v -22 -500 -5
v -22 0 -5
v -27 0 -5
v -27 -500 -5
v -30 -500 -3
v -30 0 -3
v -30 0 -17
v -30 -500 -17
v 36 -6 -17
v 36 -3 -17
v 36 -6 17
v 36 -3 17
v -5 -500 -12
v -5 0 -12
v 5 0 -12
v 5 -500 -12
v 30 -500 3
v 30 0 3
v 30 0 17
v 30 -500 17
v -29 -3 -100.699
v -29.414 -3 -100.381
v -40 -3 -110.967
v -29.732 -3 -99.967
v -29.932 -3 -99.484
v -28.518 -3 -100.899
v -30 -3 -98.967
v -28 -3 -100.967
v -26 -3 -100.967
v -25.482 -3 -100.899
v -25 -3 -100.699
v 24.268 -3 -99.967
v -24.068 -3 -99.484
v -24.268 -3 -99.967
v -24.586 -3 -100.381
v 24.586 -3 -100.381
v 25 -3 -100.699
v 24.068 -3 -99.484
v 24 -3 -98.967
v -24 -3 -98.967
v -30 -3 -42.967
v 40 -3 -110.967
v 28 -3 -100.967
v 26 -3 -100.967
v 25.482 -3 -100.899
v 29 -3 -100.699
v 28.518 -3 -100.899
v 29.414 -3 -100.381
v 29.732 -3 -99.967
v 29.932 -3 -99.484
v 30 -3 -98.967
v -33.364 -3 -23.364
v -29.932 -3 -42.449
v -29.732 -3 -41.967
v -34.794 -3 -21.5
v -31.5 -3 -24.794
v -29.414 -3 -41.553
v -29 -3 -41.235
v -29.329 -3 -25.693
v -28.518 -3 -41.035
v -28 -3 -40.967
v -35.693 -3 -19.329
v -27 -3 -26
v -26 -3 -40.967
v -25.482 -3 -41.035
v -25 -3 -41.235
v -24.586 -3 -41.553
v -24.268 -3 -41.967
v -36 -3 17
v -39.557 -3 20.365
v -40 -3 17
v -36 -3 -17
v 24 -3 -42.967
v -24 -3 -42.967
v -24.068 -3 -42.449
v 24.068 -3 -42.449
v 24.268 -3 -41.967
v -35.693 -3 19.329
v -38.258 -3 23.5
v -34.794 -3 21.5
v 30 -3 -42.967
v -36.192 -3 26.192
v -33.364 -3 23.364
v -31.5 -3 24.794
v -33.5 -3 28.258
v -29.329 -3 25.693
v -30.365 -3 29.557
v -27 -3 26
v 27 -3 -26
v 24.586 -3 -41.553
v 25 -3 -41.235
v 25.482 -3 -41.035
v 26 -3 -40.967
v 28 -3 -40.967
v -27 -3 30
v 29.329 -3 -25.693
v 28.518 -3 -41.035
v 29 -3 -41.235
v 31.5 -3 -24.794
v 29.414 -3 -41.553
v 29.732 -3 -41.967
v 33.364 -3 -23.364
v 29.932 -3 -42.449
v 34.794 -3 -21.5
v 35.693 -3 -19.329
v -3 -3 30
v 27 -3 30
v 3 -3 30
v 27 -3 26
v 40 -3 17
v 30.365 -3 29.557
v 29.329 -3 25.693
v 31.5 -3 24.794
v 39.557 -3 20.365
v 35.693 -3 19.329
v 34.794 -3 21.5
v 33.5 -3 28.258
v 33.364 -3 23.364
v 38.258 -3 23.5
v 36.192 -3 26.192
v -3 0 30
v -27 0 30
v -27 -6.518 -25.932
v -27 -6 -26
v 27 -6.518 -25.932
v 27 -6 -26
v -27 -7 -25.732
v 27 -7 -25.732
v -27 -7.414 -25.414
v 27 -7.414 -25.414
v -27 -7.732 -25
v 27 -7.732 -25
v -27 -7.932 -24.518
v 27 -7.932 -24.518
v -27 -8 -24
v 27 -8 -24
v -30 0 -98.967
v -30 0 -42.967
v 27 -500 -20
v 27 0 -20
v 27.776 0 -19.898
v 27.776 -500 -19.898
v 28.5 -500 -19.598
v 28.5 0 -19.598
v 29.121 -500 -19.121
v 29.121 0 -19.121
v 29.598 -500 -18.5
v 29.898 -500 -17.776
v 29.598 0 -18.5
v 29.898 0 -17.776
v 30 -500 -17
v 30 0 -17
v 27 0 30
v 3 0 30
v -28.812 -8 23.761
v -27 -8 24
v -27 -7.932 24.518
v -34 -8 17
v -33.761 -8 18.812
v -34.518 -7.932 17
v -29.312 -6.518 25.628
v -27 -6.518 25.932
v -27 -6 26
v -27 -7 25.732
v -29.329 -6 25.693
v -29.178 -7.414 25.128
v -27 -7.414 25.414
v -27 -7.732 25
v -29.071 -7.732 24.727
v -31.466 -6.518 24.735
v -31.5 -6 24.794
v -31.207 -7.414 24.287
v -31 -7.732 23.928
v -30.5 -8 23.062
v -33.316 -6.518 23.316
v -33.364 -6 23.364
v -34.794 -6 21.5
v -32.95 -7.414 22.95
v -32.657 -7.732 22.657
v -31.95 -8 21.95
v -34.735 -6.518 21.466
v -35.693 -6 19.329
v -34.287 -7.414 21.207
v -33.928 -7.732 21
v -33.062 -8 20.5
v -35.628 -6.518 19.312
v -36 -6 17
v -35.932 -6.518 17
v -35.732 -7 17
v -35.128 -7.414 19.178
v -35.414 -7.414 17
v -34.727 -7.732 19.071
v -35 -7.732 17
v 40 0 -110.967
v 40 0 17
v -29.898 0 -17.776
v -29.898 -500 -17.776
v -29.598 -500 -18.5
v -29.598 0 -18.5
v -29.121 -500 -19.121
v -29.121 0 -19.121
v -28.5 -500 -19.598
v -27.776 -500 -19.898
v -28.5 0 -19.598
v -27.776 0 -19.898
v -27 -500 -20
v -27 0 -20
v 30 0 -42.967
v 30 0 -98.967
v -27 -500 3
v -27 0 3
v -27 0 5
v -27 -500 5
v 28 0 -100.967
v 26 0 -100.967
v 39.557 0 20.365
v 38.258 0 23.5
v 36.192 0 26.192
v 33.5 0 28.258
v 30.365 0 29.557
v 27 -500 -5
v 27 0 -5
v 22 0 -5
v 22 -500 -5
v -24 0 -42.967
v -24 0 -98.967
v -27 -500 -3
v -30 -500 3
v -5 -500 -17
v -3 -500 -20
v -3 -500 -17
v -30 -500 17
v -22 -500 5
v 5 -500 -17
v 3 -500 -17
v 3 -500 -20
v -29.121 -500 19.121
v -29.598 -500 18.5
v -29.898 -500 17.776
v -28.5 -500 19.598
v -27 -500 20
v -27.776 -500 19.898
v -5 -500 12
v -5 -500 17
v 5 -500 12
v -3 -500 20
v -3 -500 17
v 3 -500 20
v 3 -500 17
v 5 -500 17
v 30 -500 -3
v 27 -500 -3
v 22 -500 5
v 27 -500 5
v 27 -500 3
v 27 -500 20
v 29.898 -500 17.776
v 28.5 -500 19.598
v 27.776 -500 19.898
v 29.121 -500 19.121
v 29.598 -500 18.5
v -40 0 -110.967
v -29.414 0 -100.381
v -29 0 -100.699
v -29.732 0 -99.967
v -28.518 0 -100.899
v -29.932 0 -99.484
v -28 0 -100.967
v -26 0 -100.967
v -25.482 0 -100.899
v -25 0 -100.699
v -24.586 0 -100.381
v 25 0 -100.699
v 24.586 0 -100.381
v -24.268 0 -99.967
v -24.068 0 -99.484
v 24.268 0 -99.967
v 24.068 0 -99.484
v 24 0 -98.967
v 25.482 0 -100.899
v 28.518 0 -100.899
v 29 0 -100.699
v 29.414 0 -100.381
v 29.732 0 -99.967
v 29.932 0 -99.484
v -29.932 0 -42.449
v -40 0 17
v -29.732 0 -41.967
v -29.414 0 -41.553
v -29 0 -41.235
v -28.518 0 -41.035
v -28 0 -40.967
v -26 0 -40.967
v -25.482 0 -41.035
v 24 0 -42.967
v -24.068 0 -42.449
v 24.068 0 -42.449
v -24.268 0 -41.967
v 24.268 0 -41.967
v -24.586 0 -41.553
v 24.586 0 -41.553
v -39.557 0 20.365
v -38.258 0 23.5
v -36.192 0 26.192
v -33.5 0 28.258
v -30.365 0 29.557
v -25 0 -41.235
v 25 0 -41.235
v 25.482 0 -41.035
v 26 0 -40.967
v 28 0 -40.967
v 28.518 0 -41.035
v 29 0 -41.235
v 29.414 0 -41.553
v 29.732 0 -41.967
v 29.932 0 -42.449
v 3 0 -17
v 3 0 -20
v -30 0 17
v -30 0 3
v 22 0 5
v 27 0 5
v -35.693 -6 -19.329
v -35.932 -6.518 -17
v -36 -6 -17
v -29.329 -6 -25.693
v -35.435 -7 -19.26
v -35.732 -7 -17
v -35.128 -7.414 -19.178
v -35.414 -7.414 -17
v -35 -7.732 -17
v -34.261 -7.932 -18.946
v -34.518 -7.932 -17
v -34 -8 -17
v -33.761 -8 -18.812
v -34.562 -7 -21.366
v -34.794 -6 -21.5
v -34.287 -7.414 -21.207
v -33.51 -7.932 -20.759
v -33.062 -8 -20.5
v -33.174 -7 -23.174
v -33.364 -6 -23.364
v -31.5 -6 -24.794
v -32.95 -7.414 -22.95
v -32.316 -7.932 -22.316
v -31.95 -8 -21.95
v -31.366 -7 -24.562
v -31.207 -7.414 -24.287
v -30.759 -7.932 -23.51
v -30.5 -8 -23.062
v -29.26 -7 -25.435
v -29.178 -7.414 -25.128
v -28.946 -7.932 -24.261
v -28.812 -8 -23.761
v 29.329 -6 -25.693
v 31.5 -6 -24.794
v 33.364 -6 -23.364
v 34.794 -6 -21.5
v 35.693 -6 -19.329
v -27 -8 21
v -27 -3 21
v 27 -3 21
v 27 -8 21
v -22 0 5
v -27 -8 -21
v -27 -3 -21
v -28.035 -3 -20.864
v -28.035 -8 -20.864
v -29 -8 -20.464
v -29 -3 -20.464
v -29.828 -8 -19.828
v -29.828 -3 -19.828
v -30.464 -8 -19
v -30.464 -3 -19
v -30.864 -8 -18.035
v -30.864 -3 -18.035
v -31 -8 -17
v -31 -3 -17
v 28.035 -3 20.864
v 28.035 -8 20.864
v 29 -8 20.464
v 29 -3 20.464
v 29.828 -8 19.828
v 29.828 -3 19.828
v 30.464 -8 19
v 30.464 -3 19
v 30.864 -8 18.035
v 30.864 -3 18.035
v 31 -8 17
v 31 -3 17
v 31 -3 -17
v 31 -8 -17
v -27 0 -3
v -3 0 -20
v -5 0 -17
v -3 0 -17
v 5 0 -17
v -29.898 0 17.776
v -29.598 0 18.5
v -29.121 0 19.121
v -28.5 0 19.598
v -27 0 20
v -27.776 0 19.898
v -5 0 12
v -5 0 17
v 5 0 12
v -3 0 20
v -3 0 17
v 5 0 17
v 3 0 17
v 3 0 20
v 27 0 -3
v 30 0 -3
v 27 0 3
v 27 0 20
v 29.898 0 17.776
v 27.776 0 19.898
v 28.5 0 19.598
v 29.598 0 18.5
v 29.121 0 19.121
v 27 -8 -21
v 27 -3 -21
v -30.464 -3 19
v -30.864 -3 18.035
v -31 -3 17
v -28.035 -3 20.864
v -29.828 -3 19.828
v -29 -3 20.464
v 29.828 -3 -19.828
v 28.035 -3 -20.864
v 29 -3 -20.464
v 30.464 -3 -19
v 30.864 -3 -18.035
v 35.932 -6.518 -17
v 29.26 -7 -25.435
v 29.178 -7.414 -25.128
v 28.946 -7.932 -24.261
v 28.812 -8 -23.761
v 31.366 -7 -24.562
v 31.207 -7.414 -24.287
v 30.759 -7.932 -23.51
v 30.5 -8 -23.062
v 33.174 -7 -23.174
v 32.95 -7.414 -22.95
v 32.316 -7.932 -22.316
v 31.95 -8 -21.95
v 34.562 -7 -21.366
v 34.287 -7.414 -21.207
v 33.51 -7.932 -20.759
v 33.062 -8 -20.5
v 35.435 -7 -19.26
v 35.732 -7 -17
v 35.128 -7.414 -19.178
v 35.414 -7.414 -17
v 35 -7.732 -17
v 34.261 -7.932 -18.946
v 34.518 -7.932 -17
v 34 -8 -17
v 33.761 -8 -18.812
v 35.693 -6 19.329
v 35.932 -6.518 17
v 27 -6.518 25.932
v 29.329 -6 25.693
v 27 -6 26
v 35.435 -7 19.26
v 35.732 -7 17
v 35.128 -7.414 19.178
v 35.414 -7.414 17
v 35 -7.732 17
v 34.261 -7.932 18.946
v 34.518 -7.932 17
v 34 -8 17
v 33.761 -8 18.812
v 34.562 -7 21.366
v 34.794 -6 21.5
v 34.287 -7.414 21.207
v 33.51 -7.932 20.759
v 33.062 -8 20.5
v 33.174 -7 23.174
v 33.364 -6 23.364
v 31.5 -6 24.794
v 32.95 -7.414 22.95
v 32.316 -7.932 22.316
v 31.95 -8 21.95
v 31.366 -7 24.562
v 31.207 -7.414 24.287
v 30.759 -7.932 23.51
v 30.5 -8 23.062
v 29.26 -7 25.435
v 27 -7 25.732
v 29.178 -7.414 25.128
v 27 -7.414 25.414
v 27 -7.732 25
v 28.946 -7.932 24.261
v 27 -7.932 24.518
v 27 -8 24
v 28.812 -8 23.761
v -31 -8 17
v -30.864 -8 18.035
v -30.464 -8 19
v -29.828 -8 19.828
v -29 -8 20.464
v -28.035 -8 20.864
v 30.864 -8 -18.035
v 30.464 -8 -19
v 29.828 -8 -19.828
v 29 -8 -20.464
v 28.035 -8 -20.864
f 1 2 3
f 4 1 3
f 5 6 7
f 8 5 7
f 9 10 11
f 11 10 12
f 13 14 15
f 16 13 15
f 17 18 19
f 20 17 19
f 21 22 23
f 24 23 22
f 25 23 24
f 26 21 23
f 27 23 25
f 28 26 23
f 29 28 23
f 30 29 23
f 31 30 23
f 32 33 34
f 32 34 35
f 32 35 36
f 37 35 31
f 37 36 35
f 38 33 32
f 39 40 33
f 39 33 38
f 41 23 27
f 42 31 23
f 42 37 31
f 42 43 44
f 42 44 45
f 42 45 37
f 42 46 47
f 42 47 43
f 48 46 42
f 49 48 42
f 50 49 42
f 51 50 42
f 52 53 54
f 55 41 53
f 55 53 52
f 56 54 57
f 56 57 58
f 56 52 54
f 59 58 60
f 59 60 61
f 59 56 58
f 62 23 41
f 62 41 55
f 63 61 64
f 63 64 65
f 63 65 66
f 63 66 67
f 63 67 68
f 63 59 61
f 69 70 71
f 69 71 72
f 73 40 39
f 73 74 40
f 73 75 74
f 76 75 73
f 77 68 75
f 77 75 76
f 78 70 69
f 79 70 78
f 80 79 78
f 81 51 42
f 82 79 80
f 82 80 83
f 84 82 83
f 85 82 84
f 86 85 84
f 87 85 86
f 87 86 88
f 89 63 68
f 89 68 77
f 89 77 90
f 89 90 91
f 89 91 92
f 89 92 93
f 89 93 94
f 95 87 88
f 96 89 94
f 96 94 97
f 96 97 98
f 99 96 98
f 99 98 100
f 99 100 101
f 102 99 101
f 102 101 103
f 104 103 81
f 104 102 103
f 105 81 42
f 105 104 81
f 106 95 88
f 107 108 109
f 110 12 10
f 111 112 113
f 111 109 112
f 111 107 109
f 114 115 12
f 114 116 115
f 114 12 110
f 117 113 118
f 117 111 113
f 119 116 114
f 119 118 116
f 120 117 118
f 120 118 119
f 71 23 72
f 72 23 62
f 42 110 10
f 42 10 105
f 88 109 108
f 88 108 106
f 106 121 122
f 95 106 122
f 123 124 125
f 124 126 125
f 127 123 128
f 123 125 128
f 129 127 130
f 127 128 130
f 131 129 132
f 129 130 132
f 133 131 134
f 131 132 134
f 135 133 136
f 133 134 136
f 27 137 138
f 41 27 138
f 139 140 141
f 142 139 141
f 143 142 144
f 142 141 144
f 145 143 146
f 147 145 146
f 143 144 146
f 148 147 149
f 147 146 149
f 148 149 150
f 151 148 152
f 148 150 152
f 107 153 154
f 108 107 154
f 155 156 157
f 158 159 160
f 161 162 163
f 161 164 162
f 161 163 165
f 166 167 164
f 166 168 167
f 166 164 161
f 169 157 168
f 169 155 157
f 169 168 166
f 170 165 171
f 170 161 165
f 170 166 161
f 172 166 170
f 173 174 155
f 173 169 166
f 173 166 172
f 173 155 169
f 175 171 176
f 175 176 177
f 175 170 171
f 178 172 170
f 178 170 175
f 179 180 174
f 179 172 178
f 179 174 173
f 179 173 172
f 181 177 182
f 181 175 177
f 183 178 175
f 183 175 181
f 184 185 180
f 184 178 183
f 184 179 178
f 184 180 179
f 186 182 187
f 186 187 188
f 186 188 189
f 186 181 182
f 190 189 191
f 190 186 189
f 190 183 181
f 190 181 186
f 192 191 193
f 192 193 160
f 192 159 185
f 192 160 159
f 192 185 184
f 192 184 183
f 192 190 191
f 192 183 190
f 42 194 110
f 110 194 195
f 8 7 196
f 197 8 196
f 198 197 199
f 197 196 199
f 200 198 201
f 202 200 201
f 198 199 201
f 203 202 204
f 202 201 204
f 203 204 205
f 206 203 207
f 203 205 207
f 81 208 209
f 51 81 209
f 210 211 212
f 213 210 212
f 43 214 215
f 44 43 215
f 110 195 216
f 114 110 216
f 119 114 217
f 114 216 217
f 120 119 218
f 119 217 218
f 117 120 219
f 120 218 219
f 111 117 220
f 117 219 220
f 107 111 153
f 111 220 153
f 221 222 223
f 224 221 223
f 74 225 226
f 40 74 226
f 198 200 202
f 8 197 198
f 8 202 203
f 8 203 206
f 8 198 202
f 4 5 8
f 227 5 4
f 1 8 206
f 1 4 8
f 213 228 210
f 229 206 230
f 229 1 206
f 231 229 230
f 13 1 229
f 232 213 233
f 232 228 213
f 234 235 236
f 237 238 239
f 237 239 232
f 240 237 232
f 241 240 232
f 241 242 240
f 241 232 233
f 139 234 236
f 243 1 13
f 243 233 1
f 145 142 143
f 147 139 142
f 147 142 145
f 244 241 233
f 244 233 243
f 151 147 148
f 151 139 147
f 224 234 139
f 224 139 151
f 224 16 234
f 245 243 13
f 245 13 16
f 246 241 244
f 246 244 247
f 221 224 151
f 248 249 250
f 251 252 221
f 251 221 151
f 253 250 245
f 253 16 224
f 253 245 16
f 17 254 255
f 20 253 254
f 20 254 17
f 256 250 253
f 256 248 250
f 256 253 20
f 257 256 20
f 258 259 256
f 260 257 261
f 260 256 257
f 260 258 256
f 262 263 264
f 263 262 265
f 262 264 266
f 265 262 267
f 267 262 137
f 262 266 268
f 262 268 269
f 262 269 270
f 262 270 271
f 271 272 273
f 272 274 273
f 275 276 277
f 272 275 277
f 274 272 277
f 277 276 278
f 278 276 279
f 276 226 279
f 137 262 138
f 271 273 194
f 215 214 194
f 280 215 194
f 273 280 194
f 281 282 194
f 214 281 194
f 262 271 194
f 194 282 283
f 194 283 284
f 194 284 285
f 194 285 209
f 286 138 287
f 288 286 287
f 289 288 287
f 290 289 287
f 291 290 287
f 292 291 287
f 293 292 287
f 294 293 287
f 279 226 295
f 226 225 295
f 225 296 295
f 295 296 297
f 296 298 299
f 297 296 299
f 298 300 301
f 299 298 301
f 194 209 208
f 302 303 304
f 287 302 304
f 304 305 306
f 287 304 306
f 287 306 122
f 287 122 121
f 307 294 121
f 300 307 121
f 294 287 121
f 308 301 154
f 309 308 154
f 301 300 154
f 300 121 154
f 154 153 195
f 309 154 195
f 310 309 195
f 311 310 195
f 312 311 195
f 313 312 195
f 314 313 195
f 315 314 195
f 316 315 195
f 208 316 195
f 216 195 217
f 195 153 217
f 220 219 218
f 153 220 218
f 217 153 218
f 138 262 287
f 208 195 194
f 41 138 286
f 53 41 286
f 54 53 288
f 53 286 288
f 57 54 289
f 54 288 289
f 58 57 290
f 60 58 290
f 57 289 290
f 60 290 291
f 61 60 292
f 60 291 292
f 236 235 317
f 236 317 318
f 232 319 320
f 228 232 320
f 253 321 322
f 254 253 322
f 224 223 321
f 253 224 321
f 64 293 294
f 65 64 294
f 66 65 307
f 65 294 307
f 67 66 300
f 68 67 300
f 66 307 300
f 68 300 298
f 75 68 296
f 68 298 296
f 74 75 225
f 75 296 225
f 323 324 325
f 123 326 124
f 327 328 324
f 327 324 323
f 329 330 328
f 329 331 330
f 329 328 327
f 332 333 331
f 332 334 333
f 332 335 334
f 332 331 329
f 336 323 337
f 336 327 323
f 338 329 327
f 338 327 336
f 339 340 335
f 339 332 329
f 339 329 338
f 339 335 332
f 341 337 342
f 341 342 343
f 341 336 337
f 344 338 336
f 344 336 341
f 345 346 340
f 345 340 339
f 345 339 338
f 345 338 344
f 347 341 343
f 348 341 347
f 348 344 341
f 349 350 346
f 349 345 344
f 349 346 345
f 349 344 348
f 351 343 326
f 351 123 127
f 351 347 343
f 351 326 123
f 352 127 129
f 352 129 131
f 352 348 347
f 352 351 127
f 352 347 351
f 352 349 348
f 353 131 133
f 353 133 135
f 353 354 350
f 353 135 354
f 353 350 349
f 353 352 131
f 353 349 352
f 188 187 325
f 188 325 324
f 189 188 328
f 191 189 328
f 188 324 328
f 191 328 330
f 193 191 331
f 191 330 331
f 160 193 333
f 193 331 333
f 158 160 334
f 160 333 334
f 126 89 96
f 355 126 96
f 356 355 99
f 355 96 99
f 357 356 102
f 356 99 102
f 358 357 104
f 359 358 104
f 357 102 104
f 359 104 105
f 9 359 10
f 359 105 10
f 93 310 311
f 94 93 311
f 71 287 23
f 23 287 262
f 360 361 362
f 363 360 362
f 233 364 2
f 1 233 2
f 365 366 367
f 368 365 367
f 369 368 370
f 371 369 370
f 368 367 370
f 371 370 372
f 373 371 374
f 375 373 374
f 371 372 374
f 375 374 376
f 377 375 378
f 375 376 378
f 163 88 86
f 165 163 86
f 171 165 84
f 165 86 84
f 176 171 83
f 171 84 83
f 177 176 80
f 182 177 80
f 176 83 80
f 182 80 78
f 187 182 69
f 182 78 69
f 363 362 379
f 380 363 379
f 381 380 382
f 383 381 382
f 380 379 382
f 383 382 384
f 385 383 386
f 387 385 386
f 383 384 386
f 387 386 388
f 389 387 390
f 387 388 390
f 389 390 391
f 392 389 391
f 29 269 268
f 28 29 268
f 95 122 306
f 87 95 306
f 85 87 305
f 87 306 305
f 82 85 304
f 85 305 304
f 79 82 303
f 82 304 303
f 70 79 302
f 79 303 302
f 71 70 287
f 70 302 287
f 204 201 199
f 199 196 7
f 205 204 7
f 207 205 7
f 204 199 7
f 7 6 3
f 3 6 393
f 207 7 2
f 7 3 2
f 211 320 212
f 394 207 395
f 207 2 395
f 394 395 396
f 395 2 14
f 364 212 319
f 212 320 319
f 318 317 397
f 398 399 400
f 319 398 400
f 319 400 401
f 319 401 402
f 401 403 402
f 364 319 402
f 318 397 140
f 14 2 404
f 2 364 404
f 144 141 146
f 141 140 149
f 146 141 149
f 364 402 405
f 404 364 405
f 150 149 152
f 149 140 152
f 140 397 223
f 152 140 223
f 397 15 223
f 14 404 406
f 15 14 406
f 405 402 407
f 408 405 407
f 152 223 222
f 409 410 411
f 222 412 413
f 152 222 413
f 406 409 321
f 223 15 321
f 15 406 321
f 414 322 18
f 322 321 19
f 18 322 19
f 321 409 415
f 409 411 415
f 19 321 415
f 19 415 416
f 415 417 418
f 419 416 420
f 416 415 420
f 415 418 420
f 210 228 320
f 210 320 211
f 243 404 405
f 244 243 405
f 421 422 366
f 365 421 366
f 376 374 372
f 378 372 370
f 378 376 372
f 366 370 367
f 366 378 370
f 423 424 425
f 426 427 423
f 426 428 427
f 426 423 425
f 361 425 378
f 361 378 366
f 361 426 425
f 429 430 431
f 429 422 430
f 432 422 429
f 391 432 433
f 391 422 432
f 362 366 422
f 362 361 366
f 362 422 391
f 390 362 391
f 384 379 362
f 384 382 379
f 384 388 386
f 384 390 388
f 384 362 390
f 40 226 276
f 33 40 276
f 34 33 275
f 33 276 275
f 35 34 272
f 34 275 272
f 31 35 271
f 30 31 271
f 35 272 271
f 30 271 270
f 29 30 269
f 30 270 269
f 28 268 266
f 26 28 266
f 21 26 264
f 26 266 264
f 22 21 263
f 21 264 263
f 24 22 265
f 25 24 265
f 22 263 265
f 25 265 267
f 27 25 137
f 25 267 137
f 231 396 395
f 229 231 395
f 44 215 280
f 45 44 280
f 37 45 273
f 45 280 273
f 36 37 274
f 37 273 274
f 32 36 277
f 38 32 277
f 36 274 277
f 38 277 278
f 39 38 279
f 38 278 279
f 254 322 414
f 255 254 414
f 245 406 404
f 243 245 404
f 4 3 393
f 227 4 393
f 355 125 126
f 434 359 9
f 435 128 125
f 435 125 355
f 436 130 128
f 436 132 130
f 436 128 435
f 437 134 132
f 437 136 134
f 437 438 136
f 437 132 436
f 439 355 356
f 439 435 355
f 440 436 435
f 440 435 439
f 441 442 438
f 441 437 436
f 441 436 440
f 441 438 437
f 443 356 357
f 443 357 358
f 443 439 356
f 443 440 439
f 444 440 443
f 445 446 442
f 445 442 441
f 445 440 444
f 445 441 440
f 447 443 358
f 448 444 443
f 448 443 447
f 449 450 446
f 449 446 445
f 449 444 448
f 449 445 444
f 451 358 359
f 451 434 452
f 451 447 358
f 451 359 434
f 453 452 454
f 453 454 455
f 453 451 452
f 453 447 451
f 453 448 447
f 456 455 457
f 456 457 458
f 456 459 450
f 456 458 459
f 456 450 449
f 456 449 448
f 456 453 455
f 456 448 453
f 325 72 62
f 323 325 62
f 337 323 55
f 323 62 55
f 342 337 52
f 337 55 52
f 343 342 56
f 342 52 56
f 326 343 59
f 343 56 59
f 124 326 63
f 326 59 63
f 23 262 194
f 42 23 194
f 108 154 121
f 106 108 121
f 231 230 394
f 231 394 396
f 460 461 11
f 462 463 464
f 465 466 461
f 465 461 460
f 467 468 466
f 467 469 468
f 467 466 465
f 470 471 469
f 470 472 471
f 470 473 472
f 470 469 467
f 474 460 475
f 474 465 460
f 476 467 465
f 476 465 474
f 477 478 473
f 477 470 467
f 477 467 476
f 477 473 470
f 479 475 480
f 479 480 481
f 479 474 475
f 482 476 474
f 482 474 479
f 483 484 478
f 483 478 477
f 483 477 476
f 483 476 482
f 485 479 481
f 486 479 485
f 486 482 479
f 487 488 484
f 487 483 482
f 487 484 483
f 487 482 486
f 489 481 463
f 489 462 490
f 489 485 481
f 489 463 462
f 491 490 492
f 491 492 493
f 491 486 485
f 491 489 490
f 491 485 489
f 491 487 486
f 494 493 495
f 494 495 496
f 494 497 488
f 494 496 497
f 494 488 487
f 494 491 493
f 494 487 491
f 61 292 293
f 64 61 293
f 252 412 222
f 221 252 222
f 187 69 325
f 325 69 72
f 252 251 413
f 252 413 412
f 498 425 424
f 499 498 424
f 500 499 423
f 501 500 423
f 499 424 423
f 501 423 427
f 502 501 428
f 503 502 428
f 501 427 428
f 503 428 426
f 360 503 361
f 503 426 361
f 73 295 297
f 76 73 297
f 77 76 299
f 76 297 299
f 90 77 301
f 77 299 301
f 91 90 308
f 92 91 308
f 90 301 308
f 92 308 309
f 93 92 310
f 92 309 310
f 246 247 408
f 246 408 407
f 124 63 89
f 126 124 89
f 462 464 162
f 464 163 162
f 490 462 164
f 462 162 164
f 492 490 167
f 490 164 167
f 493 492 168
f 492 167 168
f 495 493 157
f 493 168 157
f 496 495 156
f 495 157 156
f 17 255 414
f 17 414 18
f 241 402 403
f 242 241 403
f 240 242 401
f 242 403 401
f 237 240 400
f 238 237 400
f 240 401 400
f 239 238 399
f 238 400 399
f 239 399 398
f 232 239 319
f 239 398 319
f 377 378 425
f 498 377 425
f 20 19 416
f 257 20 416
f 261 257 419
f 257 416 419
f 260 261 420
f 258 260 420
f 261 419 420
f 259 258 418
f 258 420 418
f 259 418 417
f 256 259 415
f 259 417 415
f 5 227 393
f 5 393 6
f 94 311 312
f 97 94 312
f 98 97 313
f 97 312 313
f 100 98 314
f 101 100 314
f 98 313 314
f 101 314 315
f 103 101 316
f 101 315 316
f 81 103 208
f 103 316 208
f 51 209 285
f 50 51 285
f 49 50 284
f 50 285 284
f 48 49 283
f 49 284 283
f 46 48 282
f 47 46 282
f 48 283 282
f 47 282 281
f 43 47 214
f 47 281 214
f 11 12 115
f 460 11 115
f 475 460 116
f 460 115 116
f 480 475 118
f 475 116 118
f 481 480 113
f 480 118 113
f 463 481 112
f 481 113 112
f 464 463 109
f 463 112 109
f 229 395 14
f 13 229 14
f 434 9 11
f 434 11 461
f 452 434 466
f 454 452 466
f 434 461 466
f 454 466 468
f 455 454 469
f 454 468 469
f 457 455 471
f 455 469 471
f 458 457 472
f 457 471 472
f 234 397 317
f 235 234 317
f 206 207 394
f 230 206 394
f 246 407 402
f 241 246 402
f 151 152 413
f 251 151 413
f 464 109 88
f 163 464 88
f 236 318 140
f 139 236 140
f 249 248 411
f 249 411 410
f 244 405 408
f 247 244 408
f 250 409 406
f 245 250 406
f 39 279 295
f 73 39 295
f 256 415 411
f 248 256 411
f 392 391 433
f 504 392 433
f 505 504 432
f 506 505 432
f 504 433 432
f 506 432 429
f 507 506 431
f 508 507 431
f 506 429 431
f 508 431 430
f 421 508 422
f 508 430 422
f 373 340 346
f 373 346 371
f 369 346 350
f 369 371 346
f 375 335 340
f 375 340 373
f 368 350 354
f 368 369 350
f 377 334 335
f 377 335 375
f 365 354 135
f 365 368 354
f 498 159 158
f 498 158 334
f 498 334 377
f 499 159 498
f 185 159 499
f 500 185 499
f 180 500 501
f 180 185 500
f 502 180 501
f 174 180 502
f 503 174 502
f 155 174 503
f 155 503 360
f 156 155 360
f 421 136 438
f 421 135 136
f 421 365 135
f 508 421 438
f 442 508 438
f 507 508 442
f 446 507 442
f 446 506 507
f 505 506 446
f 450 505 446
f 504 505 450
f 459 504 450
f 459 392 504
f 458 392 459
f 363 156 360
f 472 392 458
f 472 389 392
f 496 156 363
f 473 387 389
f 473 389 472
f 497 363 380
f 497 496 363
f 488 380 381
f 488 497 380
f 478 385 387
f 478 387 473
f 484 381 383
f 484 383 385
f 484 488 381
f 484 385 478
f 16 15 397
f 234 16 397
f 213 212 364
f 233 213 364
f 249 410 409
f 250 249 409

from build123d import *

# Parameters (mm, degrees)
F1_DEPTH = 500
F3_DEPTH = 3
F5_DEPTH = 5
F6_R     = 2


with BuildPart() as f1:
    # F0 (on Front) → F1 (new body)
    with BuildSketch(Plane.XZ):
        with BuildLine():
            Line((3, -20), (27, -20))
            ThreePointArc((27, -20), (29.12132, -19.12132), (30, -17))
            Line((30, -17), (30, -3))
            Line((30, -3), (27, -3))
            Line((27, -3), (27, -5))
            Line((27, -5), (22, -5))
            Line((22, -5), (22, 5))
            Line((22, 5), (27, 5))
            Line((27, 5), (27, 3))
            Line((27, 3), (30, 3))
            Line((30, 3), (30, 17))
            ThreePointArc((30, 17), (29.12132, 19.12132), (27, 20))
            Line((27, 20), (3, 20))
            Line((3, 20), (3, 17))
            Line((3, 17), (5, 17))
            Line((5, 17), (5, 12))
            Line((5, 12), (-5, 12))
            Line((-5, 12), (-5, 17))
            Line((-5, 17), (-3, 17))
            Line((-3, 17), (-3, 20))
            Line((-3, 20), (-27, 20))
            ThreePointArc((-27, 20), (-29.12132, 19.12132), (-30, 17))
            Line((-30, 17), (-30, 3))
            Line((-30, 3), (-27, 3))
            Line((-27, 3), (-27, 5))
            Line((-27, 5), (-22, 5))
            Line((-22, 5), (-22, -5))
            Line((-22, -5), (-27, -5))
            Line((-27, -5), (-27, -3))
            Line((-27, -3), (-30, -3))
            Line((-30, -3), (-30, -17))
            ThreePointArc((-30, -17), (-29.12132, -19.12132), (-27, -20))
            Line((-27, -20), (-3, -20))
            Line((-3, -20), (-3, -17))
            Line((-3, -17), (-5, -17))
            Line((-5, -17), (-5, -12))
            Line((-5, -12), (5, -12))
            Line((5, -12), (5, -17))
            Line((5, -17), (3, -17))
            Line((3, -17), (3, -20))
        make_face()
    extrude(amount=F1_DEPTH)


with BuildPart() as f3:
    # F2 (on Front) → F3 (new body)
    with BuildSketch(Plane.XZ):
        with BuildLine():
            Line((3, 29.999999), (-3, 30))
            Line((-3, 30), (-27, 30))
            ThreePointArc((-27, 30), (-36.192388, 26.192388), (-40, 17))
            Line((-40, 17), (-40, 3))
            Line((-40, 3), (-40, -110.966856))
            Line((-40, -110.966856), (39.999999, -110.966856))
            Line((39.999999, -110.966856), (39.999999, 3))
            Line((39.999999, 3), (39.999999, 17))
            ThreePointArc((39.999999, 17), (36.192388, 26.192388), (27, 29.999999))
            Line((27, 29.999999), (3, 29.999999))
        make_face()
        with BuildLine():
            ThreePointArc((-24, -98.966856), (-24.585786, -100.381069), (-26, -100.966856))
            Line((-26, -100.966856), (-28, -100.966856))
            ThreePointArc((-28, -100.966856), (-29.414214, -100.381069), (-30, -98.966856))
            Line((-30, -98.966856), (-30, -42.966856))
            ThreePointArc((-30, -42.966856), (-29.414214, -41.552642), (-28, -40.966856))
            Line((-28, -40.966856), (-26, -40.966856))
            ThreePointArc((-26, -40.966856), (-24.585786, -41.552642), (-24, -42.966856))
            Line((-24, -42.966856), (-24, -98.966856))
        make_face(mode=Mode.SUBTRACT)
        with BuildLine():
            ThreePointArc((26, -100.966856), (24.585786, -100.381069), (24, -98.966856))
            Line((24, -98.966856), (24, -42.966856))
            ThreePointArc((24, -42.966856), (24.585786, -41.552642), (26, -40.966856))
            Line((26, -40.966856), (28, -40.966856))
            ThreePointArc((28, -40.966856), (29.414214, -41.552642), (30, -42.966856))
            Line((30, -42.966856), (30, -98.966856))
            ThreePointArc((30, -98.966856), (29.414214, -100.381069), (28, -100.966856))
            Line((28, -100.966856), (26, -100.966856))
        make_face(mode=Mode.SUBTRACT)
    extrude(amount=F3_DEPTH)

    # F4 (on face) → F5 (join)
    with BuildSketch(Plane.XZ.offset(3)):
        with BuildLine():
            Line((3, 26.000001), (-3, 26.000001))
            Line((-3, 26.000001), (-27, 26.000001))
            ThreePointArc((-27, 26.000001), (-33.363961, 23.363961), (-36.000001, 17))
            Line((-36.000001, 17), (-36.000001, 3))
            Line((-36.000001, 3), (-36.000001, -3))
            Line((-36.000001, -3), (-36.000001, -17))
            ThreePointArc((-36.000001, -17), (-33.363961, -23.363961), (-27, -26.000001))
            Line((-27, -26.000001), (-3, -26.000001))
            Line((-3, -26.000001), (3, -26.000001))
            Line((3, -26.000001), (27, -26.000001))
            ThreePointArc((27, -26.000001), (33.363961, -23.363961), (36.000001, -17))
            Line((36.000001, -17), (36.000001, -3))
            Line((36.000001, -3), (36.000001, 3))
            Line((36.000001, 3), (36.000001, 17))
            ThreePointArc((36.000001, 17), (33.363961, 23.363961), (27, 26.000001))
            Line((27, 26.000001), (3, 26.000001))
        make_face()
        with BuildLine():
            Line((-31, -3), (-31, 3))
            Line((-31, 3), (-31, 17))
            ThreePointArc((-31, 17), (-29.828427, 19.828427), (-27, 21))
            Line((-27, 21), (-3, 21))
            Line((-3, 21), (3, 21))
            Line((3, 21), (27, 21))
            ThreePointArc((27, 21), (29.828427, 19.828427), (31, 17))
            Line((31, 17), (31, 3))
            Line((31, 3), (31, -3))
            Line((31, -3), (31, -17))
            ThreePointArc((31, -17), (29.828427, -19.828427), (27, -21))
            Line((27, -21), (3, -21))
            Line((3, -21), (-3, -21))
            Line((-3, -21), (-27, -21))
            ThreePointArc((-27, -21), (-29.828427, -19.828427), (-31, -17))
            Line((-31, -17), (-31, -3))
        make_face(mode=Mode.SUBTRACT)
    extrude(amount=F5_DEPTH)

    # F6
    f6_edges = [f3.edges().sort_by_distance(p)[0] for p in [
        (33.363961, -8, -23.363961),
    ]]
    fillet(f6_edges, radius=F6_R)


solid = Compound([f1.part, f3.part])
